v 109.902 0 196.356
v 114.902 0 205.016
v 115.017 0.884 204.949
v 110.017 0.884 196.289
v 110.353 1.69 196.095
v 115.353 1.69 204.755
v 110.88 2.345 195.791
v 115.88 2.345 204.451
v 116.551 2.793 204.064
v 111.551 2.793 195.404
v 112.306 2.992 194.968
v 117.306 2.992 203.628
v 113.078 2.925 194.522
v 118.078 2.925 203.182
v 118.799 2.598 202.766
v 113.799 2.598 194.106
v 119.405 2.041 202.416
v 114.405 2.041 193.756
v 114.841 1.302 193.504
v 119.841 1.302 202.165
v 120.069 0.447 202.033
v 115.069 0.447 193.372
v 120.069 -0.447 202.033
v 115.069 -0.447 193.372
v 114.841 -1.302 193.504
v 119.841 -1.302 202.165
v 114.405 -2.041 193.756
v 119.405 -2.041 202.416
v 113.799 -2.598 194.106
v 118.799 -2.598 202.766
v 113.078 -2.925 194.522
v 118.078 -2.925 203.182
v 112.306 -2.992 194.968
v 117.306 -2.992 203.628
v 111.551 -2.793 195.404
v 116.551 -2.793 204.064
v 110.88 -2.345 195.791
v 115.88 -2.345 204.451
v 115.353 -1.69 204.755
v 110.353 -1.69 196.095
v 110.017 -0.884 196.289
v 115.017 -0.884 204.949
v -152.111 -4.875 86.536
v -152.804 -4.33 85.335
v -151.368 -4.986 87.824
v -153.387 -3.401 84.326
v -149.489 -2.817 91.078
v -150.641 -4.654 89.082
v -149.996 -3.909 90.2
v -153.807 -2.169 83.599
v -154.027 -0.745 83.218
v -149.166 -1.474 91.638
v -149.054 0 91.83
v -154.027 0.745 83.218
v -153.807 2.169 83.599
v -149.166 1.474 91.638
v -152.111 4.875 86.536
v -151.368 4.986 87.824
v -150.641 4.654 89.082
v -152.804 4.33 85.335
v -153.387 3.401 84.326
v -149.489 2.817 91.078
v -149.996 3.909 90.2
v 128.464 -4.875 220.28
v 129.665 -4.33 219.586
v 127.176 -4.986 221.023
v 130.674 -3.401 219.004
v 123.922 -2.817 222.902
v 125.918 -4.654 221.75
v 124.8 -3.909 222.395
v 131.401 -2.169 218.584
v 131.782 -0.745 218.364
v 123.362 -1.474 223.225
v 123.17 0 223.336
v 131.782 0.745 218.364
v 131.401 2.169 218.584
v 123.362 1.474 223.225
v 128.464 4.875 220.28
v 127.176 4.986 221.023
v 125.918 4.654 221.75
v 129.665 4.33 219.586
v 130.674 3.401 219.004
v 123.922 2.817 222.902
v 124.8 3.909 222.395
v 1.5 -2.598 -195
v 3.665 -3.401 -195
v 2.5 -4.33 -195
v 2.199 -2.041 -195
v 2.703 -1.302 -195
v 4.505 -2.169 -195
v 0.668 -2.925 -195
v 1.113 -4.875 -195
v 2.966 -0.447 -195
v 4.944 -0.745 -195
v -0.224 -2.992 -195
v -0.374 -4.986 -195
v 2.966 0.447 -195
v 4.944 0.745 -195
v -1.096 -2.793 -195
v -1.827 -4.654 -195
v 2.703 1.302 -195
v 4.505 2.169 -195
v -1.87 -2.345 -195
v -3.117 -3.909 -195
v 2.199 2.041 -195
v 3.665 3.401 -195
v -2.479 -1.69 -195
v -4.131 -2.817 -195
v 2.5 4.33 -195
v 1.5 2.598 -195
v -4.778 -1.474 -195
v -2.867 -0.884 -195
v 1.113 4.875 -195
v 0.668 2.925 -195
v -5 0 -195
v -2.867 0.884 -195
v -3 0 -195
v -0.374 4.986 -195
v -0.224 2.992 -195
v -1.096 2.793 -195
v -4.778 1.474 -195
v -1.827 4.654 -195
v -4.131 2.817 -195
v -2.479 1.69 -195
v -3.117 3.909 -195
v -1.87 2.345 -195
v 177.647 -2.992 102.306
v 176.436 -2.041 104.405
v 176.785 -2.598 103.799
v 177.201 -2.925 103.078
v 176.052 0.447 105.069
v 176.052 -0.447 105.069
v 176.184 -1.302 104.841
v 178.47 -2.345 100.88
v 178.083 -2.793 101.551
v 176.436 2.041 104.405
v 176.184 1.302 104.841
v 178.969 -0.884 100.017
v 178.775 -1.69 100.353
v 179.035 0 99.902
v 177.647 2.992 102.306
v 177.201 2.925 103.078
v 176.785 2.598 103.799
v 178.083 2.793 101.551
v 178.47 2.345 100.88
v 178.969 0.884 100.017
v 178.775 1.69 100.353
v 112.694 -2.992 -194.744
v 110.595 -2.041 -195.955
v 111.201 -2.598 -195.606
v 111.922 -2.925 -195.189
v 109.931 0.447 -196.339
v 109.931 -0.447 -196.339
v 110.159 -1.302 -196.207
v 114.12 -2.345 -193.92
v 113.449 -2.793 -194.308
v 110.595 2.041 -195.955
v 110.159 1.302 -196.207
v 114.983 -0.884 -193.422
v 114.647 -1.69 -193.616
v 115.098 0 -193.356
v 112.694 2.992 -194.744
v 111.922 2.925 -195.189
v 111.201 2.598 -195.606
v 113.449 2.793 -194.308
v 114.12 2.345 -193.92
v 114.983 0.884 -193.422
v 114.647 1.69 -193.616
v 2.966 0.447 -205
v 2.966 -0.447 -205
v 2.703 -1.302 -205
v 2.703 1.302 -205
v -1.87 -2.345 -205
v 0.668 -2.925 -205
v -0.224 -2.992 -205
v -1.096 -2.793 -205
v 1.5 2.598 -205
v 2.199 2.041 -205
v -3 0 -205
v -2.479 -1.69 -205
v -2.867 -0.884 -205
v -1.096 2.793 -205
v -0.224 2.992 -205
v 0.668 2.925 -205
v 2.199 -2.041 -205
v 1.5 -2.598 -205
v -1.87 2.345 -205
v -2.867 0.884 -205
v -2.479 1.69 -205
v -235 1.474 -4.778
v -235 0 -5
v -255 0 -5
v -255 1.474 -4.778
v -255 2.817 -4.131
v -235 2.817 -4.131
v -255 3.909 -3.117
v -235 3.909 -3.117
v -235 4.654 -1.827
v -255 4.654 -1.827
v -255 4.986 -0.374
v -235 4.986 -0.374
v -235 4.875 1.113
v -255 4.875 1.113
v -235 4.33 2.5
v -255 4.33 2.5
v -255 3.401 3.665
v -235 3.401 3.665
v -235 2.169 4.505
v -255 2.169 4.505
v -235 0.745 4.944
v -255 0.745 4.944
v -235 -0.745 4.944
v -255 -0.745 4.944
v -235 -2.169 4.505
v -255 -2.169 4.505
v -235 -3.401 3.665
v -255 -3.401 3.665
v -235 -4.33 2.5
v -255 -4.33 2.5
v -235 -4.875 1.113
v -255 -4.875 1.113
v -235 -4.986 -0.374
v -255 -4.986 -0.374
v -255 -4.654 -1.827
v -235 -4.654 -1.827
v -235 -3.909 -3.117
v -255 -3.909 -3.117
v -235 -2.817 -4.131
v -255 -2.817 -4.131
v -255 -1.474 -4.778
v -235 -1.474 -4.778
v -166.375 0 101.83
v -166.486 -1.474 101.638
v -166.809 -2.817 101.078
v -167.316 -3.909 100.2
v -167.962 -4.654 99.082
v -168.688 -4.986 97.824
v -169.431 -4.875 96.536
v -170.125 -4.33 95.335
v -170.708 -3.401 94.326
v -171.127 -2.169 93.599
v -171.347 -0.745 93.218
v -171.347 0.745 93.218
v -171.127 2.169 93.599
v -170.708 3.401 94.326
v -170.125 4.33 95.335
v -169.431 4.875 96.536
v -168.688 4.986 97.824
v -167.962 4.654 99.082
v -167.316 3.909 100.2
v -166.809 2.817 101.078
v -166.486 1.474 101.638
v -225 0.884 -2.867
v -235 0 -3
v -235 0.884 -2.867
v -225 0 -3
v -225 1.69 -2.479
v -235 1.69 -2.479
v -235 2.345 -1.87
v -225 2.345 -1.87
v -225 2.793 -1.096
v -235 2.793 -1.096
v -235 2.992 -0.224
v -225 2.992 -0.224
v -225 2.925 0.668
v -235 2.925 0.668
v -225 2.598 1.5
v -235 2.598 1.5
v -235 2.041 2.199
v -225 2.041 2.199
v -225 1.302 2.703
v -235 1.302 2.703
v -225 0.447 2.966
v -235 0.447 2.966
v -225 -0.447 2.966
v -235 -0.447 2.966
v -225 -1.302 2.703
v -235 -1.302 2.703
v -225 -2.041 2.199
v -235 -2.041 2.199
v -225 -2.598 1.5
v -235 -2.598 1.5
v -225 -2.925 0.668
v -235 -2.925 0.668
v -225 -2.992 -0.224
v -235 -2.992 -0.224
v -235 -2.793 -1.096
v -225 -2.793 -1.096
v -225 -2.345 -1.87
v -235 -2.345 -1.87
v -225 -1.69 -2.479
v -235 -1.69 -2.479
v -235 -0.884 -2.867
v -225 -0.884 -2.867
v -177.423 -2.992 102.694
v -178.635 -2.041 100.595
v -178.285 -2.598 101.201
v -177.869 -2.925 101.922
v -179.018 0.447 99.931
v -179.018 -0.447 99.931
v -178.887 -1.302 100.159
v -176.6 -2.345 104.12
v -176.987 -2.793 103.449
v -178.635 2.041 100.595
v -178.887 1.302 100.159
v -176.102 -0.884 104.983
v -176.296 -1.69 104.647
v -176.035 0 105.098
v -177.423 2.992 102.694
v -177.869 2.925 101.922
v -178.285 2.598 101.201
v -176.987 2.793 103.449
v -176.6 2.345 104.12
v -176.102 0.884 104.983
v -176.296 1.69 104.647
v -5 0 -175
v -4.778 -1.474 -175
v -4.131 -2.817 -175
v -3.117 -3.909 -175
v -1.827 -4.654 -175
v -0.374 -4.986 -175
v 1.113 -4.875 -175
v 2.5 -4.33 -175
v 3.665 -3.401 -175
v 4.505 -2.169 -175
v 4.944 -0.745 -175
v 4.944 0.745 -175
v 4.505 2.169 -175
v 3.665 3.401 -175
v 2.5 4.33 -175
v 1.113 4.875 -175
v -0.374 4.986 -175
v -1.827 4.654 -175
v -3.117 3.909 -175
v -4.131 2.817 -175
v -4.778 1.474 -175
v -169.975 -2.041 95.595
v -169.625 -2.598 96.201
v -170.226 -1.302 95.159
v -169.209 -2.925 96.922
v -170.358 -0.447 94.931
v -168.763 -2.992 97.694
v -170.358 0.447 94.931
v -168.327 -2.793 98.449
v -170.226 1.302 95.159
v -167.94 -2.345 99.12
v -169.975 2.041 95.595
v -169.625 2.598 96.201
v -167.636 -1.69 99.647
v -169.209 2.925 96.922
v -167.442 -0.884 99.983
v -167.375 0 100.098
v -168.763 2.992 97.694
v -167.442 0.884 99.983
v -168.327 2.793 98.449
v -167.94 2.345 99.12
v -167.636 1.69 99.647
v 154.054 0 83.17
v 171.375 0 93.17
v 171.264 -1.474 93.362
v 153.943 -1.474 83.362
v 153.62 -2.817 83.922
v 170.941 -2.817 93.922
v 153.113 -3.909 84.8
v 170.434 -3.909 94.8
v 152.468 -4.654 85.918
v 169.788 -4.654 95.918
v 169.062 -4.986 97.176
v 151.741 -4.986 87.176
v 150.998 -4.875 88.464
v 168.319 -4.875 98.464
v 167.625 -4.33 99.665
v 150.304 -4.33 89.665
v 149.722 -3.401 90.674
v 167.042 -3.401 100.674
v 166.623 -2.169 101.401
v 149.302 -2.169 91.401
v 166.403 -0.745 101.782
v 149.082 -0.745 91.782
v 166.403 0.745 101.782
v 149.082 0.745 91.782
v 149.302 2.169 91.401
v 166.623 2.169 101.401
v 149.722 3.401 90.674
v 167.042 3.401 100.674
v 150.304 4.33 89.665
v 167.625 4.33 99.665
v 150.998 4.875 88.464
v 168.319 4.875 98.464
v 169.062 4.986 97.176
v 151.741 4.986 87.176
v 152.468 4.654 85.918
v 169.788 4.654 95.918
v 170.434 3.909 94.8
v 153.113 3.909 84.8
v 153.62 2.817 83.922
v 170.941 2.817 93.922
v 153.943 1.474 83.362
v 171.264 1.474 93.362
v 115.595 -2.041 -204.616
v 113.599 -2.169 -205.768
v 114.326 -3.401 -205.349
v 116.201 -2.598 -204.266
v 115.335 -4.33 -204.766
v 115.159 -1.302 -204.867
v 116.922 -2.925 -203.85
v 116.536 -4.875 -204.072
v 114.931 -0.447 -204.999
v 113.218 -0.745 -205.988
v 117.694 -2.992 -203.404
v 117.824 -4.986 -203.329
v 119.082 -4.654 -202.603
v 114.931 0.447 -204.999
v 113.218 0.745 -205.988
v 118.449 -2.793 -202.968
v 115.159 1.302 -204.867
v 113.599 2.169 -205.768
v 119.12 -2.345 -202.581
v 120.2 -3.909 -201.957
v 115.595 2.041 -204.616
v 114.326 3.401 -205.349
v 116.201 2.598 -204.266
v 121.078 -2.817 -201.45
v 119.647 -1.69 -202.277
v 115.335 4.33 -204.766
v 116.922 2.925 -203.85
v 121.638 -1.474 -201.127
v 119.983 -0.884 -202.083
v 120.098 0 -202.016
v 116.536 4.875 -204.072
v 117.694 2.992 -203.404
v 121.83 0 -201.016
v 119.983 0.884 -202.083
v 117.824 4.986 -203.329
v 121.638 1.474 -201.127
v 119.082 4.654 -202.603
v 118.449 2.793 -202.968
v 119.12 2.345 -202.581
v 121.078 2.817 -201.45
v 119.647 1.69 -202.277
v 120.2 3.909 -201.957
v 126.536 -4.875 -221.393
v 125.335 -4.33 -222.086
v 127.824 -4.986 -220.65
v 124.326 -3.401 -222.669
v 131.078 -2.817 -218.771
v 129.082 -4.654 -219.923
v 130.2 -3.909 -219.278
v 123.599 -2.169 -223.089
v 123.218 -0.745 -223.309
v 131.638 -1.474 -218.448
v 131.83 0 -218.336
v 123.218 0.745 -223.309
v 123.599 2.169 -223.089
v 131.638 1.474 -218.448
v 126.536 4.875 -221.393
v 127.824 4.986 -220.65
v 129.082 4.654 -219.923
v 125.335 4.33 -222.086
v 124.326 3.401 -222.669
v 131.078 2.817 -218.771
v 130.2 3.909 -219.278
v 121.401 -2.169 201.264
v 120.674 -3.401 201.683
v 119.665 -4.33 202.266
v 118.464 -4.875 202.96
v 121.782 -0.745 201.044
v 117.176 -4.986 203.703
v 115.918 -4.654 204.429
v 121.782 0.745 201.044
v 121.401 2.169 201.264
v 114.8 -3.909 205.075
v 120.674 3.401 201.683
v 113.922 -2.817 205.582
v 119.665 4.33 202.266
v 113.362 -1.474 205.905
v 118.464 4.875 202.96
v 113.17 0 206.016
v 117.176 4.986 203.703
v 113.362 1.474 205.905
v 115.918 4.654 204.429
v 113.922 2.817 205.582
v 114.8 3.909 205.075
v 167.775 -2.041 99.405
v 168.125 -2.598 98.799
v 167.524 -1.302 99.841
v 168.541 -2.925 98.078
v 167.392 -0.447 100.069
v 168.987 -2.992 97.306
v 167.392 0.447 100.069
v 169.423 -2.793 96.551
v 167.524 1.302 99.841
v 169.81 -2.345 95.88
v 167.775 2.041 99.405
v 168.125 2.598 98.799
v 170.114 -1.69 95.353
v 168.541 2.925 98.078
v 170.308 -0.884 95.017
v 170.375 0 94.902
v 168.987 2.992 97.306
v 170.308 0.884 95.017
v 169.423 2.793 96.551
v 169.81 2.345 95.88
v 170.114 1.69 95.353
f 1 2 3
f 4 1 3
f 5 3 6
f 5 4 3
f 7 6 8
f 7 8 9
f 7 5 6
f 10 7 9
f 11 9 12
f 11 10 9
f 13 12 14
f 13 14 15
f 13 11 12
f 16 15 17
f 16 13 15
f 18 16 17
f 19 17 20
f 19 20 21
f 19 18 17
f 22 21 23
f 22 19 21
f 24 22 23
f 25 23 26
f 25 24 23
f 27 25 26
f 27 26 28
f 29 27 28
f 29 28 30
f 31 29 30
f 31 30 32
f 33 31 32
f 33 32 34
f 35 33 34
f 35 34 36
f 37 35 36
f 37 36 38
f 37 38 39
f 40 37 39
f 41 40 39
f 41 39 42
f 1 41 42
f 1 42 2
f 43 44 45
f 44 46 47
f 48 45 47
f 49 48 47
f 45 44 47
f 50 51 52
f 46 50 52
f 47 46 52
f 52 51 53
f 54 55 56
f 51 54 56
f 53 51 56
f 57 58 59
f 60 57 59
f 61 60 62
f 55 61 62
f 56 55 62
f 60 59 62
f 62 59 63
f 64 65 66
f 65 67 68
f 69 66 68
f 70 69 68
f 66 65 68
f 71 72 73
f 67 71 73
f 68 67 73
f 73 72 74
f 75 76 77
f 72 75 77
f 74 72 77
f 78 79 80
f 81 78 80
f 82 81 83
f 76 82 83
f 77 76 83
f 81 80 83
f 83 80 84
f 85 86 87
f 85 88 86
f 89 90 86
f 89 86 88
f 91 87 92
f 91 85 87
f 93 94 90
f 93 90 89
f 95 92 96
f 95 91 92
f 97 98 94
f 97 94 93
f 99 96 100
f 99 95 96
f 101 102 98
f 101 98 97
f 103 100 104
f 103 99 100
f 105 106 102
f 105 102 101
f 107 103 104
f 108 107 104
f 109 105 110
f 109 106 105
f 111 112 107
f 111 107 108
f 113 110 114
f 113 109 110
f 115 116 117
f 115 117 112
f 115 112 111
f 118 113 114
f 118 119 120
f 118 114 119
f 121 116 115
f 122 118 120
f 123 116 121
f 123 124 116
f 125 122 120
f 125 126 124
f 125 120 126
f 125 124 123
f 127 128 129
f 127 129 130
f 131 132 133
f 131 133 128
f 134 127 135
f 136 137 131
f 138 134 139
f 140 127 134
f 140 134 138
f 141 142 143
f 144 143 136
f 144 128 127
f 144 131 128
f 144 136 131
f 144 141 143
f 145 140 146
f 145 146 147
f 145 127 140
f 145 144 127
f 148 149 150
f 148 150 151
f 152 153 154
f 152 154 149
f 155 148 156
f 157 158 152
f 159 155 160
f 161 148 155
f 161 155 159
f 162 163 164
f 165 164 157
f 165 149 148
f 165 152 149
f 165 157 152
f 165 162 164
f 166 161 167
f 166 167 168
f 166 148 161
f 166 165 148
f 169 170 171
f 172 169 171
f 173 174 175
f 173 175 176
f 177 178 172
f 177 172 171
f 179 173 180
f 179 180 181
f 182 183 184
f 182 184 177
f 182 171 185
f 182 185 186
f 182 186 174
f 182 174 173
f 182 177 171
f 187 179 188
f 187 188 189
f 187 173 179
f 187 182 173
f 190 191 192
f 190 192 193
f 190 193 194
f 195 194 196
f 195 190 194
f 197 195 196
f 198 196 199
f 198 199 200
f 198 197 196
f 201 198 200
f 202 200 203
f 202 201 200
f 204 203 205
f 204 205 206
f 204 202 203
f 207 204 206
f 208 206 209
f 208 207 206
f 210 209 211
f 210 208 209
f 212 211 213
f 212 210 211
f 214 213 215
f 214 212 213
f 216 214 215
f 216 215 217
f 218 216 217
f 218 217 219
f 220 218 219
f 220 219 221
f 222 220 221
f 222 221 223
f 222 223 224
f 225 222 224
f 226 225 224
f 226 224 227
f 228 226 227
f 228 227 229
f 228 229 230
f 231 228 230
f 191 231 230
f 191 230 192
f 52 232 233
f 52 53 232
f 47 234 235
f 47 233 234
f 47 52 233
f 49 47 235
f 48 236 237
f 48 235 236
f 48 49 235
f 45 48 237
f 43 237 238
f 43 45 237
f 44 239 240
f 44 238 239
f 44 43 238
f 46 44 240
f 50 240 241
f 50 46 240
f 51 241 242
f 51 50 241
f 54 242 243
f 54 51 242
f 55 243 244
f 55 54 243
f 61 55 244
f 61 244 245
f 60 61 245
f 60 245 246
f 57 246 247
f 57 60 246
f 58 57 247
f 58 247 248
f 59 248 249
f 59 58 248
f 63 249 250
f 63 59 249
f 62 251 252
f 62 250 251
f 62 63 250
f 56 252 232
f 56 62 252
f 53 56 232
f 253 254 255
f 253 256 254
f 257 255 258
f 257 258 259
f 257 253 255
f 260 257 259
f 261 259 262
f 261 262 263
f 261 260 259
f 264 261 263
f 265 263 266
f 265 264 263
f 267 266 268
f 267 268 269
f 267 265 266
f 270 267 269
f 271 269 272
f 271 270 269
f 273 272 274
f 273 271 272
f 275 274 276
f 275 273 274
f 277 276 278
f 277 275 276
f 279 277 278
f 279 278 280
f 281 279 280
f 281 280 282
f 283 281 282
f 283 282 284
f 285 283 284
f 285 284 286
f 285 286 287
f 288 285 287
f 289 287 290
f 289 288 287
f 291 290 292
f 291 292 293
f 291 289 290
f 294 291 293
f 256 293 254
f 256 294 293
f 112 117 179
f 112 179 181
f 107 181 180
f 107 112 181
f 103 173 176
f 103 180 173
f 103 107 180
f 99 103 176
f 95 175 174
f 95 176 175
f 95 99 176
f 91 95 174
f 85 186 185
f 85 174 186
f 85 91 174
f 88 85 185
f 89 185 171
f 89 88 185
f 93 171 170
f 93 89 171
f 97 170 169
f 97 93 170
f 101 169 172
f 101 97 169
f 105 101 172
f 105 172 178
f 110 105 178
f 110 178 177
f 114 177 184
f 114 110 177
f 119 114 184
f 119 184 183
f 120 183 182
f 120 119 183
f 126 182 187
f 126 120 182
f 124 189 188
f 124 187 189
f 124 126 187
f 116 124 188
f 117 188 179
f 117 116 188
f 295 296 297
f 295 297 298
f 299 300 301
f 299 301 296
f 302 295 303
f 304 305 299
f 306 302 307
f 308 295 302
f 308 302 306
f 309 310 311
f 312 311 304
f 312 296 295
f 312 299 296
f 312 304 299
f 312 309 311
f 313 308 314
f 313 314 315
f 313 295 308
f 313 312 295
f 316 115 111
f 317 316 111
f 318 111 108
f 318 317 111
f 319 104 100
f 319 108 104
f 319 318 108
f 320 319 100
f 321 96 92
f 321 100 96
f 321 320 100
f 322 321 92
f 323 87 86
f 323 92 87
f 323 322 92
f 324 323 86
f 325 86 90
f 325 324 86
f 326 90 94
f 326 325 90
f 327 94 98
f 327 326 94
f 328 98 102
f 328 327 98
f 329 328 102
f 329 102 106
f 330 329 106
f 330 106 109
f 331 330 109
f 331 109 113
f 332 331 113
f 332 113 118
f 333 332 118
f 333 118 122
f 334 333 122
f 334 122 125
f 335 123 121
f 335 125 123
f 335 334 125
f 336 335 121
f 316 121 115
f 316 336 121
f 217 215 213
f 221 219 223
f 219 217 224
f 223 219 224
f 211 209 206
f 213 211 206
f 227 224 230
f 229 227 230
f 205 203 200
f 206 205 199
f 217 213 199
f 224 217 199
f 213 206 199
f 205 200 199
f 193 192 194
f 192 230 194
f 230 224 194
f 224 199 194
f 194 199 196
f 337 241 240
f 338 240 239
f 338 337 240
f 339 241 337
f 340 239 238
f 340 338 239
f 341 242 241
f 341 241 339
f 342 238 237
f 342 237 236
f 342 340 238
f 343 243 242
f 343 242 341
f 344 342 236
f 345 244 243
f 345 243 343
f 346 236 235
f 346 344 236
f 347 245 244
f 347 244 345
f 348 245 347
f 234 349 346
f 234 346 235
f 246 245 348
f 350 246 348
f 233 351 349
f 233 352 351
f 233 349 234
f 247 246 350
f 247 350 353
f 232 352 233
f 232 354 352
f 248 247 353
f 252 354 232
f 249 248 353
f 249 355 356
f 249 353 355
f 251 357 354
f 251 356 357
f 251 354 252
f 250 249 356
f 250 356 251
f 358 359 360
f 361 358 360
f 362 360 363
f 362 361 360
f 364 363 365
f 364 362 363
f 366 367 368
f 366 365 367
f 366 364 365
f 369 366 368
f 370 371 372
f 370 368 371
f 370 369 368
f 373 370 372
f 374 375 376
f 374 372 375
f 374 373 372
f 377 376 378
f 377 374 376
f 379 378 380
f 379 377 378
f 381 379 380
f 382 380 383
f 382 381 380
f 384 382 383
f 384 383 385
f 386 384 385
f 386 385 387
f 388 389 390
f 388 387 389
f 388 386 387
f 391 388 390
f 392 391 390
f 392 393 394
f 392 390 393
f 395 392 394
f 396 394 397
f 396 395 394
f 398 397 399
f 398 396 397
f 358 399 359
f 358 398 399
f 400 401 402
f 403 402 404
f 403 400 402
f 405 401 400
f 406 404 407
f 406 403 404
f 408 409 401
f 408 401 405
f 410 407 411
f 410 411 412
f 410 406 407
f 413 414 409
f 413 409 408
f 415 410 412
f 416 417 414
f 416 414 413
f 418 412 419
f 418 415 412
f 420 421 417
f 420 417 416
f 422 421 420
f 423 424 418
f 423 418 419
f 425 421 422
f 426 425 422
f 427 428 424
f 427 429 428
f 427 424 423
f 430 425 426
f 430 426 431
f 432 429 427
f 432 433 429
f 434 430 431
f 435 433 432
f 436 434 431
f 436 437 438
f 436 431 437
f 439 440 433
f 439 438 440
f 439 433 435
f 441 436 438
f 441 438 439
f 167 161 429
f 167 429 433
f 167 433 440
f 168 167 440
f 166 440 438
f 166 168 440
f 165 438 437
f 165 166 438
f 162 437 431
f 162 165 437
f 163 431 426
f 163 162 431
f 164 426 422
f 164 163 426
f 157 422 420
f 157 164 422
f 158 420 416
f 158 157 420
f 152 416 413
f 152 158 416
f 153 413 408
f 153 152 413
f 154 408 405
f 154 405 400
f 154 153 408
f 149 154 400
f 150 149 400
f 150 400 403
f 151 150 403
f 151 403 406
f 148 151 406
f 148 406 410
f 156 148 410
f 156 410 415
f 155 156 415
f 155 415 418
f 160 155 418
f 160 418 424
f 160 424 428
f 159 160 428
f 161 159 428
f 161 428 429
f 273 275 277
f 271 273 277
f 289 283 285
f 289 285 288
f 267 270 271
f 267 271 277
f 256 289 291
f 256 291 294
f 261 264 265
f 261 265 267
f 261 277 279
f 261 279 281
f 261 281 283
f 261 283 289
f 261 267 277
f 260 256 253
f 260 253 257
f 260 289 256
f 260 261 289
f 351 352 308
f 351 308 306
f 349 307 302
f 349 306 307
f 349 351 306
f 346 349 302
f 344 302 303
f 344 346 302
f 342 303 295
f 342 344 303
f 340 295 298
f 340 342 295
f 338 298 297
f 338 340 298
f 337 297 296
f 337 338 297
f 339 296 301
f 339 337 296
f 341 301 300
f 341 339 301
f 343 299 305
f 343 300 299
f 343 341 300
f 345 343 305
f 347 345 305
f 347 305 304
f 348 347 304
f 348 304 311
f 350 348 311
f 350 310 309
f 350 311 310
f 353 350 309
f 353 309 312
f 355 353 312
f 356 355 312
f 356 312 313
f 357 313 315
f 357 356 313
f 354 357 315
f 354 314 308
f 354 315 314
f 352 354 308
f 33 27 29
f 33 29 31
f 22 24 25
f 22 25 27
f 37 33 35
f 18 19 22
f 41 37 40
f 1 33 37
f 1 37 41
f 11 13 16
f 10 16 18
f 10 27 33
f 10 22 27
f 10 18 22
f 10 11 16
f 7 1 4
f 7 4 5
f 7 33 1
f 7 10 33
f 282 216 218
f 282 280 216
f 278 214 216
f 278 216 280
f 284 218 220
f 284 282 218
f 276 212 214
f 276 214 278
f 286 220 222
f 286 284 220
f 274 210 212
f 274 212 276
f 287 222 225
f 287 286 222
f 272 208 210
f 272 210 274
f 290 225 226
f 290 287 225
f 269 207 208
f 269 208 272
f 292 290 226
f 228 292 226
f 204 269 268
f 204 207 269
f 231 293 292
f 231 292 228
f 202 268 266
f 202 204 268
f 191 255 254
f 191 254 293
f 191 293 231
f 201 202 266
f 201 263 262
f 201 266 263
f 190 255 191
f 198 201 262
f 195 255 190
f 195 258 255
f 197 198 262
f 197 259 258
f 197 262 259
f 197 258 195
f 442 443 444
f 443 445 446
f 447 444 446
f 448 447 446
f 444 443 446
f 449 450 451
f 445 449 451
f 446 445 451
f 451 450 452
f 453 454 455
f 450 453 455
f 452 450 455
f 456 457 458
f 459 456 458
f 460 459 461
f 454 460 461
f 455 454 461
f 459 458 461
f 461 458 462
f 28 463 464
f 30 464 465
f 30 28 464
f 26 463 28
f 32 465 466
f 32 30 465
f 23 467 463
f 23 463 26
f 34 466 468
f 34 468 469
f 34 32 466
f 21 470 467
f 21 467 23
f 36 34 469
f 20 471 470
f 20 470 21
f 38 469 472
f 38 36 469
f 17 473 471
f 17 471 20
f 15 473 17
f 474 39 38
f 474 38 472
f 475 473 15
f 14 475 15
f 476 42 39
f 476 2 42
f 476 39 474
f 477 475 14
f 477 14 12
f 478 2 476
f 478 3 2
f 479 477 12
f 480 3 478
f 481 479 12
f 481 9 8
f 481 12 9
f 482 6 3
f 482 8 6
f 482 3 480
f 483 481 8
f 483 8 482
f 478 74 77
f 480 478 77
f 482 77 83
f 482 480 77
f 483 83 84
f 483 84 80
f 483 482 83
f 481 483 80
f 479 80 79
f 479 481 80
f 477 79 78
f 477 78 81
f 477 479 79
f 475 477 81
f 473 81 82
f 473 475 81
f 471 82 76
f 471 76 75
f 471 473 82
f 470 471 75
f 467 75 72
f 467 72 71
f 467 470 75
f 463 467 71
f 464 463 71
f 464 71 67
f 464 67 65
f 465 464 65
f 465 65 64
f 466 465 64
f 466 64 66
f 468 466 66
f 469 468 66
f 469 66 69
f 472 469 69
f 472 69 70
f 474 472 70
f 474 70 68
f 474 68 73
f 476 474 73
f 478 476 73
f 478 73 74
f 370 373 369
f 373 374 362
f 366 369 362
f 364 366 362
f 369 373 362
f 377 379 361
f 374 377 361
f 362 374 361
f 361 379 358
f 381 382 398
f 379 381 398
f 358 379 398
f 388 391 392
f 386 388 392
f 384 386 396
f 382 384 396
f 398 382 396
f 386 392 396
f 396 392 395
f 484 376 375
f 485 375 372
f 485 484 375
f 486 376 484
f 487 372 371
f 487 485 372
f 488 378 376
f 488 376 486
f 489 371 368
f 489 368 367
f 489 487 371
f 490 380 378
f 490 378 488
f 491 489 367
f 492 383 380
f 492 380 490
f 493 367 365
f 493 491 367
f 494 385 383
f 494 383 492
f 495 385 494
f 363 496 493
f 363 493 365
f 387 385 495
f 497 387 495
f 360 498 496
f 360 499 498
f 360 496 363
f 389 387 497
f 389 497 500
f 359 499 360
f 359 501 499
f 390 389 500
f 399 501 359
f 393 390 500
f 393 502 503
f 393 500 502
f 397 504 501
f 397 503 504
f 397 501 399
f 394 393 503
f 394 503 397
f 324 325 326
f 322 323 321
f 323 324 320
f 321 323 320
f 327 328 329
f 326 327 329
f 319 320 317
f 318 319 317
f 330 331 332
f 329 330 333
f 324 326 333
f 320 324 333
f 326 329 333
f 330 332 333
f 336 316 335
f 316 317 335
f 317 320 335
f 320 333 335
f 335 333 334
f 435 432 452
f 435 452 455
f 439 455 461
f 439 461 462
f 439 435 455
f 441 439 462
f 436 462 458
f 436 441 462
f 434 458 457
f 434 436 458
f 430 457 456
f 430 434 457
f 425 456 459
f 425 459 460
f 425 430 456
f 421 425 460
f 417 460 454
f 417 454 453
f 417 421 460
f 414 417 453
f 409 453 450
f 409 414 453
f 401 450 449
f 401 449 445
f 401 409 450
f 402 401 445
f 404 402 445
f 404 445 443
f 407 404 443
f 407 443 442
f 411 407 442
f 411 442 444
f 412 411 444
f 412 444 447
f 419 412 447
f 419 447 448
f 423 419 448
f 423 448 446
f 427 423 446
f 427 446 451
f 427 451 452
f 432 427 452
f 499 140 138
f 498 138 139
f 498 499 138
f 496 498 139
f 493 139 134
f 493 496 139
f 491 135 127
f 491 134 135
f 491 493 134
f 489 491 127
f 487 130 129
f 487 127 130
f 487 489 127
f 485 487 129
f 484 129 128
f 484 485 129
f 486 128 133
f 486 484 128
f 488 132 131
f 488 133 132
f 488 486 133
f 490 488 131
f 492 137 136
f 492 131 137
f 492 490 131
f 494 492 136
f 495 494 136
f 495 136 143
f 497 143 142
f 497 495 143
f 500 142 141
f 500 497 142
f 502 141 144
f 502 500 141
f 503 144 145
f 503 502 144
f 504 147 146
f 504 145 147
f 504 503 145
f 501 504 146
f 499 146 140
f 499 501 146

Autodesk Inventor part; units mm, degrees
ref_plane "YZ Plane" through (0, 0, 0) normal (1, 0, 0) x (0, 1, 0)
ref_plane "XZ Plane" through (0, 0, 0) normal (0, 1, 0) x (-1, 0, 0)
ref_plane "XY Plane" through (0, 0, 0) normal (0, 0, 1) x (1, 0, 0)
sketch "スケッチ1" plane through (0, 0, 0) normal (0, 1, 0) x (-1, 0, 0)
  line L0 (0, -246) -> (0, 41) projected
  line L1 (-51, 0) -> (306, 0) projected
  line L2 (255, 0) -> (255, -5)
  line L3 (255, -5) -> (235, -5)
  line L4 (235, -5) -> (235, -3)
  line L5 (235, -3) -> (225, -3)
  line L6 (225, -3) -> (225, 0)
  line L7 (255, 0) -> (225, 0)
  line L8 (0, -175) -> (0, -205)
  line L9 (3, -205) -> (0, -205)
  line L10 (3, -205) -> (3, -195)
  line L11 (3, -195) -> (5, -195)
  line L12 (5, -195) -> (5, -175)
  line L13 (5, -175) -> (0, -175)
  point P0 (0, 0)
  dimension "d0" = 30
  dimension "d1" = 30
  dimension "d2" = 10
  dimension "d3" = 10
  dimension "d4" = 5
  dimension "d5" = 5
  dimension "d6" = 3
  dimension "d7" = 3
  dimension "d8" = 195
  dimension "d9" = 235
revolve "回転1" add sketch "スケッチ1" angle 360 about axis through (-255, 0, 0) along (1, 0, 0) contours L1 L2 L3 L4 L5 L6
revolve "回転2" add sketch "スケッチ1" angle 360 about axis through (0, 0, -175) along (0, 0, -1) contours L0 L13 L12 L11 L10 L9
pattern_circular "円形状パターン1" count 3 over 360 about axis through (0, -10, 0) along (0, 1, 0) of "回転1", "回転2"
equation "\"d0\" = ShaftLength"
equation "\"d1\" = ShaftLength"
equation "\"d2\" = ShaftInLength"
equation "\"d3\" = ShaftInLength"
equation "\"d4\" = ShaftRadius"
equation "\"d5\" = ShaftRadius"
equation "\"d6\" = ShaftInRadius"
equation "\"d7\" = ShaftInRadius"
equation "\"ShaftInRadius\" = 3"
equation "\"ShaftRadius\" = 5"
equation "\"ShaftLength\" = 30"
equation "\"ShaftInLength\" = 10"
properties part number "BaseAxes"
